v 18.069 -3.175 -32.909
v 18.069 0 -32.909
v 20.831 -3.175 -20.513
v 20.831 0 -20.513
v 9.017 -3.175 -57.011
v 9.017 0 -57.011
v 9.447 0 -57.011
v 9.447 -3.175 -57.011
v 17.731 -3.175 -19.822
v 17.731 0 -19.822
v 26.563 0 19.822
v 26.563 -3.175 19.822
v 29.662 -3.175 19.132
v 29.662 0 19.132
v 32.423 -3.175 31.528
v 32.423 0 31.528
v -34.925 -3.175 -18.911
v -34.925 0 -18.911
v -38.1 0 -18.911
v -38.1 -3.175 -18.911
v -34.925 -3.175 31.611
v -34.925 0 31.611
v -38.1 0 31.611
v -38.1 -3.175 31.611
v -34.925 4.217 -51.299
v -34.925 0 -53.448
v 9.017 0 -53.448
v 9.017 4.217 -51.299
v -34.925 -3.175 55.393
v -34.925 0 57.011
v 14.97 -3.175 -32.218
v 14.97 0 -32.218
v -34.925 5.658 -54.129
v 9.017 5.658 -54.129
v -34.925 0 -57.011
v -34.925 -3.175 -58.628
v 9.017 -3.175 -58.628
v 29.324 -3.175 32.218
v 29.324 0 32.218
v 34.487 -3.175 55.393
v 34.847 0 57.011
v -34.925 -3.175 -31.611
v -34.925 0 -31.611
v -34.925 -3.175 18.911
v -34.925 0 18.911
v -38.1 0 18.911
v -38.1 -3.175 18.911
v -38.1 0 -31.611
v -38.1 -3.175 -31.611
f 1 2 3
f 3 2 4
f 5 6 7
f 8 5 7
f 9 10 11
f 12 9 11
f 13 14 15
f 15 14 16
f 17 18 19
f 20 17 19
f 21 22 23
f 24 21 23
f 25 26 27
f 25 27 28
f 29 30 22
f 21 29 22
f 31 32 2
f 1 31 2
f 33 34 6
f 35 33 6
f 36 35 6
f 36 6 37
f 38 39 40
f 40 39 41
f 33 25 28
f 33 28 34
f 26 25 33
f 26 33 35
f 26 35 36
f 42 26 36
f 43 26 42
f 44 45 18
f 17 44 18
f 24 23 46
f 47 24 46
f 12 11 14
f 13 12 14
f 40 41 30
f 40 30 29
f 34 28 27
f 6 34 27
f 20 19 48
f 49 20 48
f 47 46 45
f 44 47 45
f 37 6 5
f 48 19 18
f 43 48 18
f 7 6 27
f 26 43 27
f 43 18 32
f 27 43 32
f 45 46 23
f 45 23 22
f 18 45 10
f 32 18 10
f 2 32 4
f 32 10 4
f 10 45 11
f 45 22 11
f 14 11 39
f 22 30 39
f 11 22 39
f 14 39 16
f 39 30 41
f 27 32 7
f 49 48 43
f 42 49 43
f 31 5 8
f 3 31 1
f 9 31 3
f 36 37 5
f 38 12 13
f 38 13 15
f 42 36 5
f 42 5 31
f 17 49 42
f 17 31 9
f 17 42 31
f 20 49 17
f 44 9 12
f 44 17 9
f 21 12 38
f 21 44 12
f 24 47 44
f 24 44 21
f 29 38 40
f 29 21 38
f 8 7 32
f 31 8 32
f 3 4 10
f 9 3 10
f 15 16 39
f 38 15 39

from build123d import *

# Parameters (mm, degrees)
F1_DEPTH = 3.175
F4_DEPTH = 76.2
F5_DEPTH = 43.942


with BuildPart() as f1:
    # F0 (on Front) → F1 (new body)
    with BuildSketch(Plane.XZ):
        Polygon((-34.925, -57.010706), (9.447175, -57.010706), (14.970036, -32.218409), (18.069073, -32.908767), (20.830503, -20.512618), (17.731466, -19.82226), (26.562884, 19.82226), (29.661922, 19.131903), (32.423352, 31.528051), (29.324315, 32.218409), (34.847175, 57.010706), (-34.925, 57.010706), (-34.925, 31.610706), (-38.1, 31.610706), (-38.1, 18.910706), (-34.925, 18.910706), (-34.925, -18.910706), (-38.1, -18.910706), (-38.1, -31.610706), (-34.925, -31.610706), align=None)
    extrude(amount=F1_DEPTH)

    # F3 (on face) → F4 (cut)
    with BuildSketch(Plane(origin=(-34.925, 0, 0), x_dir=(0, -1, 0), z_dir=(-1, 0, 0))):
        Polygon((3.175, 57.010706), (0, 57.010706), (3.175, 55.393441), align=None)
    extrude(amount=-F4_DEPTH, mode=Mode.SUBTRACT)

    # F2 (on face) → F5 (join)
    with BuildSketch(Plane(origin=(-34.925, 0, 0), x_dir=(0, -1, 0), z_dir=(-1, 0, 0))):
        Polygon((-5.658236, -54.128543), (0, -57.010706), (3.175, -58.627972), (3.175, -55.064803), (-4.217154, -51.299425), align=None)
    extrude(amount=-F5_DEPTH)


solid = f1.part
